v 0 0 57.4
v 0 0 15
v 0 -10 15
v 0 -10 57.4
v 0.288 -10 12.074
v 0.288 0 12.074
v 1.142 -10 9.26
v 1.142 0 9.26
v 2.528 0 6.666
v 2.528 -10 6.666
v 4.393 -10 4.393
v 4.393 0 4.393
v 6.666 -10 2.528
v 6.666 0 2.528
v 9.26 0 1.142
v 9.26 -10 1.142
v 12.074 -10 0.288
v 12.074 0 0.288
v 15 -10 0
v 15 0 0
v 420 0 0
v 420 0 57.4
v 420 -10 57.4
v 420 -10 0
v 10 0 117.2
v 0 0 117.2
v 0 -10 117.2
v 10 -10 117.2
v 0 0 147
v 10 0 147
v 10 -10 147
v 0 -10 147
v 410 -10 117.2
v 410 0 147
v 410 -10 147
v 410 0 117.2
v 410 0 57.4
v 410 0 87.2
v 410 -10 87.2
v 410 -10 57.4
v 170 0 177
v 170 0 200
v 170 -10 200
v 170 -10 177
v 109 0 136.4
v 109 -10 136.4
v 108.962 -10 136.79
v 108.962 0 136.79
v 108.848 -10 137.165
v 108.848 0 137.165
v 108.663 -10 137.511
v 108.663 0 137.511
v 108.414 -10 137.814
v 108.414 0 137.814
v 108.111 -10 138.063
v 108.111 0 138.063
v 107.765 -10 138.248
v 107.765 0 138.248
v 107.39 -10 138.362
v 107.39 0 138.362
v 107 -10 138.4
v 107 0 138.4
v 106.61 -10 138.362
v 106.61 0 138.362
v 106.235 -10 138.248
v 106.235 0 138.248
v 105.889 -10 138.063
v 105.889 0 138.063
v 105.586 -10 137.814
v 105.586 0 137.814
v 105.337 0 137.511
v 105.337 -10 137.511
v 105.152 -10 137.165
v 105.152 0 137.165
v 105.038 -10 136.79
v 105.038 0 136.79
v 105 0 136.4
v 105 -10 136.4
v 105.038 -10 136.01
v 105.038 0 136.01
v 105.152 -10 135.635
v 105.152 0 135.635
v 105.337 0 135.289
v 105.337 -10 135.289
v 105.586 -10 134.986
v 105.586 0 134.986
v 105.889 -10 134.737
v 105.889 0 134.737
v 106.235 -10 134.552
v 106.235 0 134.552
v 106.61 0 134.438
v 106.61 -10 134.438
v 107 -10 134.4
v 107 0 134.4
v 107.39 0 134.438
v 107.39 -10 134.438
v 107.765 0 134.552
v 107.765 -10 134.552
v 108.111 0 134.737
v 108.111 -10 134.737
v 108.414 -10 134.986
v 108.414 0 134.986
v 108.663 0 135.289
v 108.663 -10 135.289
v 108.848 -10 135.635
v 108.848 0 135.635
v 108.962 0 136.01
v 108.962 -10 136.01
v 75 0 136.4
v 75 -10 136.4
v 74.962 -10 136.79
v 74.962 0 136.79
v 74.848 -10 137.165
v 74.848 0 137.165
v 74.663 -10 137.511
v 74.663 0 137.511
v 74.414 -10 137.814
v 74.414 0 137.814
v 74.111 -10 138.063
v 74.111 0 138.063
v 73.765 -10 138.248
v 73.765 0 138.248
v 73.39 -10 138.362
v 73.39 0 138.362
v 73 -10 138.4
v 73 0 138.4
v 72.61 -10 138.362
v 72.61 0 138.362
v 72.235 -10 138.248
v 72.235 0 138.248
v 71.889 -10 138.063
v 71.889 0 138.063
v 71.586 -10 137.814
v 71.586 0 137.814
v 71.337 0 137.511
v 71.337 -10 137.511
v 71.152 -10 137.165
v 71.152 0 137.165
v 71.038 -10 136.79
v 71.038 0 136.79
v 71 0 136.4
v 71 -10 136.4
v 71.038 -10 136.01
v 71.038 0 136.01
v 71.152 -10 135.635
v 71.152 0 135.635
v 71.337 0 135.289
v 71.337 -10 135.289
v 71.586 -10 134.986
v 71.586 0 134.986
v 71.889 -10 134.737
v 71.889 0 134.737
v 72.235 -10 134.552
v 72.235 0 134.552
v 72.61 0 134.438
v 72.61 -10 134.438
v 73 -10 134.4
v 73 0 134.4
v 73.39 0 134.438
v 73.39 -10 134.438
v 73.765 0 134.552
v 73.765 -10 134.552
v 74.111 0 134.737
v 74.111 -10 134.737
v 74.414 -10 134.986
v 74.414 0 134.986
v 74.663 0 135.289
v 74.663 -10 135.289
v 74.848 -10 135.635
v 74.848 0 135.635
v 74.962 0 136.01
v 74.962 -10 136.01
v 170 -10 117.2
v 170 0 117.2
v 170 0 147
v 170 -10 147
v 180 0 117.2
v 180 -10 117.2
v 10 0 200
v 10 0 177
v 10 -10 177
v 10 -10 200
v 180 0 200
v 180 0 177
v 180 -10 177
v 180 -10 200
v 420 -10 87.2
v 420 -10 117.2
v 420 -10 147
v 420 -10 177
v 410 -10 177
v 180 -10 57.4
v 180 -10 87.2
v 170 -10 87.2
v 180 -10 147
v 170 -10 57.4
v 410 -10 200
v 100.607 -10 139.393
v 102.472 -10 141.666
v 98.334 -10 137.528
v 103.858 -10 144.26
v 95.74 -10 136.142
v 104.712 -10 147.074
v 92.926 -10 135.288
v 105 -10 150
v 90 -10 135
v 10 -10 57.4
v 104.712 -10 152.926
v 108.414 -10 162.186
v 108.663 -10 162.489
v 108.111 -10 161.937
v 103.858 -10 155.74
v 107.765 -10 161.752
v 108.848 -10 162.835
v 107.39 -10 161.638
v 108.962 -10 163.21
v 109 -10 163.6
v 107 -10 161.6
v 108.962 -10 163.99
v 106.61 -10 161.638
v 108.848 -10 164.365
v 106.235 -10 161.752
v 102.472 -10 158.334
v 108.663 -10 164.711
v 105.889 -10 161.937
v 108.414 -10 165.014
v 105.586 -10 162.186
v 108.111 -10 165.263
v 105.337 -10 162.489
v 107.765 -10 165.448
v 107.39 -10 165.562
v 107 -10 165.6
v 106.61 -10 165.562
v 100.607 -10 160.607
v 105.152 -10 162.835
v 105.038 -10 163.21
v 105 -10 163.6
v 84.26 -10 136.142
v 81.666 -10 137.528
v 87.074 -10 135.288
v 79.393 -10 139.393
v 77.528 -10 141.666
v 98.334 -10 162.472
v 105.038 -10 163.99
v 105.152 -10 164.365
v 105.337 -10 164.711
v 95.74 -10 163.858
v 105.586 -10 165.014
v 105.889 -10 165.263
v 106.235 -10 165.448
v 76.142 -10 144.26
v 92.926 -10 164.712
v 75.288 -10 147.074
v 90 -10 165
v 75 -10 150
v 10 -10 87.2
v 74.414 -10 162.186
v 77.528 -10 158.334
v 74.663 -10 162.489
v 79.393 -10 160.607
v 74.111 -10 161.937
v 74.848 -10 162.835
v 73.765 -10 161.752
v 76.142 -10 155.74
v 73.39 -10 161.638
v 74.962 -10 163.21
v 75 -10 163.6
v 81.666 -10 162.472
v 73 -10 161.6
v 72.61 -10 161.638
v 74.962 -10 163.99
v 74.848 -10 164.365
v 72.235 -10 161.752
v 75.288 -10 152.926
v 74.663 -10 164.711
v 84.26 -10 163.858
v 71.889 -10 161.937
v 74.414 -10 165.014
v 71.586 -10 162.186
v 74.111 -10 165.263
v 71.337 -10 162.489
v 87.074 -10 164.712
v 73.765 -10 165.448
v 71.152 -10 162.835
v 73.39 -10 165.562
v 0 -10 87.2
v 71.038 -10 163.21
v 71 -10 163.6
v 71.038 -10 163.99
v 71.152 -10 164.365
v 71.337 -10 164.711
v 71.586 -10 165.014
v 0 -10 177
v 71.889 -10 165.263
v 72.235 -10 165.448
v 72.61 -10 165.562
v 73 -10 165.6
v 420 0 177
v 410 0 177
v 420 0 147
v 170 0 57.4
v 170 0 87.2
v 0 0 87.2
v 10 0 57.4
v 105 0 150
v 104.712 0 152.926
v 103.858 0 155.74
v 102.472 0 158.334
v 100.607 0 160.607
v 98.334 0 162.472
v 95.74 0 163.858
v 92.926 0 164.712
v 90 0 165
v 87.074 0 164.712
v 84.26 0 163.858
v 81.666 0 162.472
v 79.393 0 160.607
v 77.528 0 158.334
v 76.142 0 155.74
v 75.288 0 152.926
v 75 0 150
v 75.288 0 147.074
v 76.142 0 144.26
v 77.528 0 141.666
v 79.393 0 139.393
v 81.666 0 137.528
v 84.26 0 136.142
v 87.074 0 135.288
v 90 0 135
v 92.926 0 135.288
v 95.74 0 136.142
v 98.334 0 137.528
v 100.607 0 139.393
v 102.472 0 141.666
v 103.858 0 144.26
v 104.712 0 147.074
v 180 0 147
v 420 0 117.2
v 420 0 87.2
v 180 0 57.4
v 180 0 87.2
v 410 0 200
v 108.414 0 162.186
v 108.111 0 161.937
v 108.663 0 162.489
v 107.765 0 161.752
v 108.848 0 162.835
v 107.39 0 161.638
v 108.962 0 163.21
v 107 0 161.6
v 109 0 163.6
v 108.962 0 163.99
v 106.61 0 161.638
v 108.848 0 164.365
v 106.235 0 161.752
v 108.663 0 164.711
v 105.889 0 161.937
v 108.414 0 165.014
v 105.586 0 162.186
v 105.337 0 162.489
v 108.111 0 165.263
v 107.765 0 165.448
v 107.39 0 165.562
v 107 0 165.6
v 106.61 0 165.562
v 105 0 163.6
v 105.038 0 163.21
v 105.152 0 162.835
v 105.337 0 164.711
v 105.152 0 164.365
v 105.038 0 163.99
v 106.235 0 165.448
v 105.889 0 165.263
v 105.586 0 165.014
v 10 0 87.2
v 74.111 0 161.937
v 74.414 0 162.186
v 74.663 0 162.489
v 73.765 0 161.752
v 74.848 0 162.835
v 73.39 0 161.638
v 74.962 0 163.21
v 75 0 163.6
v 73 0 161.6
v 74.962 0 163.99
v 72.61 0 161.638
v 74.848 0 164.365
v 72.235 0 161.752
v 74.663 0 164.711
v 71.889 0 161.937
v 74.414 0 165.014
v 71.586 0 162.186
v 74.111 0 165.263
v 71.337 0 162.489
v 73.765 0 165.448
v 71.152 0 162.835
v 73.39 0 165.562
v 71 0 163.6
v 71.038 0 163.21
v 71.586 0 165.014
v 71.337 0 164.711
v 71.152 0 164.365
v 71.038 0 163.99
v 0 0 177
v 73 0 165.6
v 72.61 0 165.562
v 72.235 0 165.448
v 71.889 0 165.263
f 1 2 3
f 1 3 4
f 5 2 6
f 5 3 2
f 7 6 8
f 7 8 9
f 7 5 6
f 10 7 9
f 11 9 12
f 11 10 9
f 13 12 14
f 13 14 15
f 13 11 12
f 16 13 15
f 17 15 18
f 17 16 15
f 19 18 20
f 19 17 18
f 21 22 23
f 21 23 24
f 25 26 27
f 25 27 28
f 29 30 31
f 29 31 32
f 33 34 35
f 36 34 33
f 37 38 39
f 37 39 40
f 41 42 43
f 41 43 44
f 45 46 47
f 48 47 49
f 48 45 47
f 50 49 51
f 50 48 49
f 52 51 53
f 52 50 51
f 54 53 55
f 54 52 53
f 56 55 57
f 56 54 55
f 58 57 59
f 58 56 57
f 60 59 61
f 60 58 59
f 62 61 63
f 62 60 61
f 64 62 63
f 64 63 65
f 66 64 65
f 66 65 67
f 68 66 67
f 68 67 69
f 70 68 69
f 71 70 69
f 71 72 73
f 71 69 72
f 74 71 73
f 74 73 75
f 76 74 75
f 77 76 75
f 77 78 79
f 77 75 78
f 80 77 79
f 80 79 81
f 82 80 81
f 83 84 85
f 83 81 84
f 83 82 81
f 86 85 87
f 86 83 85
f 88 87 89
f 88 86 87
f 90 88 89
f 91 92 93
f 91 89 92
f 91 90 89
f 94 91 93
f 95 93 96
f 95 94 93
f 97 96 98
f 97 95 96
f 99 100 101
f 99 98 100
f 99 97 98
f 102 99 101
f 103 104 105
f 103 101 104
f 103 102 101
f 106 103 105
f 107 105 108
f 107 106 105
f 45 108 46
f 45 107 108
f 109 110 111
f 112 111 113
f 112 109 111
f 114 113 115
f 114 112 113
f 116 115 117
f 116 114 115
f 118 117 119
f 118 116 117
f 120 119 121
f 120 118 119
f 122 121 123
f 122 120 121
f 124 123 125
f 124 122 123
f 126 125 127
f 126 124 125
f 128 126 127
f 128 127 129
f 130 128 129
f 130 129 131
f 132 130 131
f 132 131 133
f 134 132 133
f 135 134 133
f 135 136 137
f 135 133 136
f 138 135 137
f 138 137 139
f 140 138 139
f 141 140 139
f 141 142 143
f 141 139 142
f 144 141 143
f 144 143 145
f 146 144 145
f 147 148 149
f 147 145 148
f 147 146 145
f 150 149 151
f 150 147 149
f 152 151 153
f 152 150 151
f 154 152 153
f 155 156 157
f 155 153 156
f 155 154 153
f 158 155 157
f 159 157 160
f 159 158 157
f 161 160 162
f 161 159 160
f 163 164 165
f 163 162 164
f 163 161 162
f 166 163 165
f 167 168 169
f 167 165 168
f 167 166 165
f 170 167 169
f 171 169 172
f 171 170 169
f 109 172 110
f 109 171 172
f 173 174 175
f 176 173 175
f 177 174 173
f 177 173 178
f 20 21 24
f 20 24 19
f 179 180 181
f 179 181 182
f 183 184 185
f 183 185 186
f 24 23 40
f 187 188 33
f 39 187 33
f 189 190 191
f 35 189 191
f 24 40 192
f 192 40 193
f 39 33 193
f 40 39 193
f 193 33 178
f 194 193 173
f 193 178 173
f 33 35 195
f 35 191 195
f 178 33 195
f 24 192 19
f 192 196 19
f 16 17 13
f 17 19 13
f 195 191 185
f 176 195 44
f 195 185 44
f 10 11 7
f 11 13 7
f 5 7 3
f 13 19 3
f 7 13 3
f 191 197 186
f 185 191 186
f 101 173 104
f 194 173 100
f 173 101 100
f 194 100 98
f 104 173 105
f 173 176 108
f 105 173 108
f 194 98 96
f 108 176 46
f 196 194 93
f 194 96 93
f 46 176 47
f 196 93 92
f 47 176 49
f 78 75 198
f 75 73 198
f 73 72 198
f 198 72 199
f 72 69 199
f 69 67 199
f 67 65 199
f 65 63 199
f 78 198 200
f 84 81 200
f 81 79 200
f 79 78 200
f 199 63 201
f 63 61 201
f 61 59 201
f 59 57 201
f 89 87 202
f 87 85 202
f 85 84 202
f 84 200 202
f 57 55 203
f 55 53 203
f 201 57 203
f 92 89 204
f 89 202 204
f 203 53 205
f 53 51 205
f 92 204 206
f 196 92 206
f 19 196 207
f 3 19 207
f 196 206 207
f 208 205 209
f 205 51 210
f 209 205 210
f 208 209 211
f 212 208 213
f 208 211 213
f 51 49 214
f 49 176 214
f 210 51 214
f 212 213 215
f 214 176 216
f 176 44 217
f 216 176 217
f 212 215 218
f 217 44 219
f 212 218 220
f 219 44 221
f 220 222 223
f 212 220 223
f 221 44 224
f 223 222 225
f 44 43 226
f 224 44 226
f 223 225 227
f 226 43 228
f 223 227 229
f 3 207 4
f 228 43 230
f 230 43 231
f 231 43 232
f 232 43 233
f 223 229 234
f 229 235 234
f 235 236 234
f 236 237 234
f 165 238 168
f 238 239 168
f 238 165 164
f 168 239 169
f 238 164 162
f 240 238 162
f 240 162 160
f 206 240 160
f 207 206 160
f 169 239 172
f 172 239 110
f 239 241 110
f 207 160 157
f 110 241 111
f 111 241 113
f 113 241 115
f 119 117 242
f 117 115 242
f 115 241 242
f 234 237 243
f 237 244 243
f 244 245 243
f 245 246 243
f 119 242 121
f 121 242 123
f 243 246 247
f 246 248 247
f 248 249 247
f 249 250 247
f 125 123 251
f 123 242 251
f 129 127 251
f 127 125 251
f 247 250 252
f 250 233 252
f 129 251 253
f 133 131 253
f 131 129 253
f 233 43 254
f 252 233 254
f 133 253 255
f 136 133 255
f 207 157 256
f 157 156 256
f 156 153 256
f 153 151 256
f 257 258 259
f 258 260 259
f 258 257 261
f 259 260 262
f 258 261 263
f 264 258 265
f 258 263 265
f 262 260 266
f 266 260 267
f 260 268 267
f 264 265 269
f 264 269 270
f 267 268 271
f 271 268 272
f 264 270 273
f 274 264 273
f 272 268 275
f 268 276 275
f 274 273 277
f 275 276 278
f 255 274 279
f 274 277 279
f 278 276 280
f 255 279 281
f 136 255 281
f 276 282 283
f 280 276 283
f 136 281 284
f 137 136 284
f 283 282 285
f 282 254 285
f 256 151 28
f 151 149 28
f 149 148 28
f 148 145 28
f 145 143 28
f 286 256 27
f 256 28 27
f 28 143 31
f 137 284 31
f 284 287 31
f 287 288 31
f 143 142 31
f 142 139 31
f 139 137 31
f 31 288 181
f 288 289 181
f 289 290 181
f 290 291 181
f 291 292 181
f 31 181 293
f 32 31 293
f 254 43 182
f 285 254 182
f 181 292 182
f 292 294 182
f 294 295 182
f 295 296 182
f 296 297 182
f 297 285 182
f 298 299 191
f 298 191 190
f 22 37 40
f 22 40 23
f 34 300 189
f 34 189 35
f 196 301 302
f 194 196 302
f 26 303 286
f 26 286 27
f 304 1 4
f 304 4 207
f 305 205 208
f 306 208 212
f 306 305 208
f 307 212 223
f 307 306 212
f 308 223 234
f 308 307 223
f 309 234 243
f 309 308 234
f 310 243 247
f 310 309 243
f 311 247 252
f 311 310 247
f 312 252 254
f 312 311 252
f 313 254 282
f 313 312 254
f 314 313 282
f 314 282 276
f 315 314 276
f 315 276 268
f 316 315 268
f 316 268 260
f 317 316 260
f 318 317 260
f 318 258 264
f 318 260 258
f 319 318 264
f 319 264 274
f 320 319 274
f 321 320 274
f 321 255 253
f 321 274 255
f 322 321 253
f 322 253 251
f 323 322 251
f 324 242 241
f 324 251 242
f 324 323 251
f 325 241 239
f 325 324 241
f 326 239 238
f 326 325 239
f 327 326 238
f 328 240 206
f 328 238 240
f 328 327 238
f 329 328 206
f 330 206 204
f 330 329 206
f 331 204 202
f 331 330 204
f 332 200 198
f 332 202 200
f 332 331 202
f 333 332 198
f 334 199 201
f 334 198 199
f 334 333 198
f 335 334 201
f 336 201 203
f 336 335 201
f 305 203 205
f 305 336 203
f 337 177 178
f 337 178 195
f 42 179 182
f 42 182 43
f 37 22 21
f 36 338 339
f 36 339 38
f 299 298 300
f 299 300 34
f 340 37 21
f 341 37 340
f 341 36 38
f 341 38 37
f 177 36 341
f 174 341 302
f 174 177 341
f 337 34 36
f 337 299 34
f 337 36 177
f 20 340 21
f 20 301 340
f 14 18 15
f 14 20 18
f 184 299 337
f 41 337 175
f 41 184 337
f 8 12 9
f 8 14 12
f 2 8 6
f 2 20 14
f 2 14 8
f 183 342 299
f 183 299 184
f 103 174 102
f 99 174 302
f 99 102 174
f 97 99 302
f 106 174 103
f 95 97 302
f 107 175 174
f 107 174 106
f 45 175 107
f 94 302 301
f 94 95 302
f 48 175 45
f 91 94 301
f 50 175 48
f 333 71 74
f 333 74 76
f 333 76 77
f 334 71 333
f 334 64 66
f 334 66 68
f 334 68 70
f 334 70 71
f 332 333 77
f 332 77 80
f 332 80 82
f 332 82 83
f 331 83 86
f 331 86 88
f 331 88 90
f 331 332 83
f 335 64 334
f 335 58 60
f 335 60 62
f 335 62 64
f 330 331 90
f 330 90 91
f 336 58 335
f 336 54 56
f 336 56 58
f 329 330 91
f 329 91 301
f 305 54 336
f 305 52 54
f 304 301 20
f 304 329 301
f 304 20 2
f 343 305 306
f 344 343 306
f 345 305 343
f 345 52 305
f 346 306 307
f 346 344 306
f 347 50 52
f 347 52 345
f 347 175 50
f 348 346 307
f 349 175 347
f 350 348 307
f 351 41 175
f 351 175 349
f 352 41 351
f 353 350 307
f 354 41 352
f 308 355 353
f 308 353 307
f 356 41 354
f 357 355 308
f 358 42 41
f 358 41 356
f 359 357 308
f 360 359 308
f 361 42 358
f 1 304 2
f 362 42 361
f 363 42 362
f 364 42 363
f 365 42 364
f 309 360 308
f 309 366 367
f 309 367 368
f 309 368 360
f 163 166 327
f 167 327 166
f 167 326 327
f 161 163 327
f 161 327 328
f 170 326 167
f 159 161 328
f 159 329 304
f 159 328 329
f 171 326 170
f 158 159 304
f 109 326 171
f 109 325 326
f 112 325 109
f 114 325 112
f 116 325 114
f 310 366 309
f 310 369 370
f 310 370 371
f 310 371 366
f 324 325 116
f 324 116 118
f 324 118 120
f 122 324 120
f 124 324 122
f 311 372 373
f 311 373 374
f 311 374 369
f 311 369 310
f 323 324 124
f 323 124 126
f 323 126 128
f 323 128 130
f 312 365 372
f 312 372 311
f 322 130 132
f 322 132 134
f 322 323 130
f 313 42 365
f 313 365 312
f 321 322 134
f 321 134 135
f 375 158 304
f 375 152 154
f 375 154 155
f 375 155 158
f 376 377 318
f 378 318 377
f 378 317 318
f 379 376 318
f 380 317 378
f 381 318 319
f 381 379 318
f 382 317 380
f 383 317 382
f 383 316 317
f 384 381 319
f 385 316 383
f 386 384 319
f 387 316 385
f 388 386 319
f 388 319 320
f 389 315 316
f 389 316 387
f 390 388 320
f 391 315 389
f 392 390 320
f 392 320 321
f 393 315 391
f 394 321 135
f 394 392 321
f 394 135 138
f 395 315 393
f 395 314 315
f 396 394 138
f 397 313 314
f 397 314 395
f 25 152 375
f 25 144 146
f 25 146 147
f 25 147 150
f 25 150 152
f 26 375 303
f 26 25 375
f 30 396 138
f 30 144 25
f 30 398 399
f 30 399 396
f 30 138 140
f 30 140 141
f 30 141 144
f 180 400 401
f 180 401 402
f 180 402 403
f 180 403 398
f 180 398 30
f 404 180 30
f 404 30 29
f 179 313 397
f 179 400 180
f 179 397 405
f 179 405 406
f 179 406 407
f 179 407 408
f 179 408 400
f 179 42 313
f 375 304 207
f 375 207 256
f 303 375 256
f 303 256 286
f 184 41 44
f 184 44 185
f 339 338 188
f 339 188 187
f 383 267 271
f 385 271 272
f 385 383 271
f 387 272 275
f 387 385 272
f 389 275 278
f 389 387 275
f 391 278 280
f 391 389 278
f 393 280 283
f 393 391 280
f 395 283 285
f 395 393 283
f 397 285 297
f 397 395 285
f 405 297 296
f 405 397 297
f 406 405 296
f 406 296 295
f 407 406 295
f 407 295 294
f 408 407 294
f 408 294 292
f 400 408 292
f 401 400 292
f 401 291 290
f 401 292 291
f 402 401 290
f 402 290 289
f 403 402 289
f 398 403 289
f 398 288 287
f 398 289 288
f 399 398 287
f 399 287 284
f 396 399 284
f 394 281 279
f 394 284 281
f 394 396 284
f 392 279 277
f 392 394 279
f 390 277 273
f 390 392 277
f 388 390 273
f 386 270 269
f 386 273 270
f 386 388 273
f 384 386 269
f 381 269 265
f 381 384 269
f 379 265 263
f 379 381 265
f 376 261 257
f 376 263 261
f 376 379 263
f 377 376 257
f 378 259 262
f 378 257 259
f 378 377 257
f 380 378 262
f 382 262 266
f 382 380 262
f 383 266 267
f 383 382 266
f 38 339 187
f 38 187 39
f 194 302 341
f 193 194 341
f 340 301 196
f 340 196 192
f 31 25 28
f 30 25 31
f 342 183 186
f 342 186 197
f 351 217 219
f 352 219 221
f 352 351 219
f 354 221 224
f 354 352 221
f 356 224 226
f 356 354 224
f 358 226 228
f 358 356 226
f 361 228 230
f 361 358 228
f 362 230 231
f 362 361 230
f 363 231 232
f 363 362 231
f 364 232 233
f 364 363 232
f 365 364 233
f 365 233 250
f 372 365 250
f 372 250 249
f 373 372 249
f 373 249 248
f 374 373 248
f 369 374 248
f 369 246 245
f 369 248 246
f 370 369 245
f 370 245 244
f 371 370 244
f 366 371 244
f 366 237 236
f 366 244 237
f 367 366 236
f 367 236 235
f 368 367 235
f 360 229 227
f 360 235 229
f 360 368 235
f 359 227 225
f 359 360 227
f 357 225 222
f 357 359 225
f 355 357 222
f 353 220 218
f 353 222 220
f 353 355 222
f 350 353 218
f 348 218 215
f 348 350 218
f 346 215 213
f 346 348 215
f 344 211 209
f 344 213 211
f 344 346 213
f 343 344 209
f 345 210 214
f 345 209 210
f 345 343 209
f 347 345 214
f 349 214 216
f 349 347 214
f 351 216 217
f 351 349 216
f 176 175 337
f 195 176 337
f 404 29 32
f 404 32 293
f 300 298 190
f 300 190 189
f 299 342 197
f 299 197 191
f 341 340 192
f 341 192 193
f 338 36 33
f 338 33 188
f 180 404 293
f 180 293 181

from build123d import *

# Parameters (mm, degrees)
SKETCH_W          = 10
SKETCH_H          = 29.8
PAD_DEPTH         = 10
COPYSKETCH001_R   = 2
COPYSKETCH001_R_2 = 15
POCKET_DEPTH      = 10.001
FILLET_R          = 15


with BuildPart() as part:
    # Sketch → Pad (new body)
    with BuildSketch(Plane.XZ):
        Polygon((0, 0), (0, 57.4), (10, 57.4), (10, 87.2), (0, 87.2), (0, 117.2), (10, 117.2), (10, 147), (0, 147), (0, 177), (10, 177), (10, 200), (170, 200), (170, 177), (180, 177), (180, 200), (410, 200), (410, 177), (420, 177), (420, 147), (410, 147), (410, 117.2), (420, 117.2), (420, 87.2), (410, 87.2), (410, 57.4), (420, 57.4), (420, 0), align=None)
        with Locations((175, 132.1)):
            Rectangle(SKETCH_W, SKETCH_H, mode=Mode.SUBTRACT)
        with Locations((175, 72.3)):
            Rectangle(SKETCH_W, SKETCH_H, mode=Mode.SUBTRACT)
    extrude(amount=PAD_DEPTH)

    # CopySketch001 → Pocket (cut, through all)
    with BuildSketch(Plane.XZ):
        with Locations((73, 163.6)):
            Circle(COPYSKETCH001_R)
        with Locations((107, 163.6)):
            Circle(COPYSKETCH001_R)
        with Locations((107, 136.4)):
            Circle(COPYSKETCH001_R)
        with Locations((73, 136.4)):
            Circle(COPYSKETCH001_R)
        with Locations((90, 150)):
            Circle(COPYSKETCH001_R_2)
    extrude(amount=POCKET_DEPTH, mode=Mode.SUBTRACT)

    # Fillet
    fillet_edges = [part.edges().sort_by_distance(p)[0] for p in [
        (0, -5, 0),
    ]]
    fillet(fillet_edges, radius=FILLET_R)


solid = part.part
